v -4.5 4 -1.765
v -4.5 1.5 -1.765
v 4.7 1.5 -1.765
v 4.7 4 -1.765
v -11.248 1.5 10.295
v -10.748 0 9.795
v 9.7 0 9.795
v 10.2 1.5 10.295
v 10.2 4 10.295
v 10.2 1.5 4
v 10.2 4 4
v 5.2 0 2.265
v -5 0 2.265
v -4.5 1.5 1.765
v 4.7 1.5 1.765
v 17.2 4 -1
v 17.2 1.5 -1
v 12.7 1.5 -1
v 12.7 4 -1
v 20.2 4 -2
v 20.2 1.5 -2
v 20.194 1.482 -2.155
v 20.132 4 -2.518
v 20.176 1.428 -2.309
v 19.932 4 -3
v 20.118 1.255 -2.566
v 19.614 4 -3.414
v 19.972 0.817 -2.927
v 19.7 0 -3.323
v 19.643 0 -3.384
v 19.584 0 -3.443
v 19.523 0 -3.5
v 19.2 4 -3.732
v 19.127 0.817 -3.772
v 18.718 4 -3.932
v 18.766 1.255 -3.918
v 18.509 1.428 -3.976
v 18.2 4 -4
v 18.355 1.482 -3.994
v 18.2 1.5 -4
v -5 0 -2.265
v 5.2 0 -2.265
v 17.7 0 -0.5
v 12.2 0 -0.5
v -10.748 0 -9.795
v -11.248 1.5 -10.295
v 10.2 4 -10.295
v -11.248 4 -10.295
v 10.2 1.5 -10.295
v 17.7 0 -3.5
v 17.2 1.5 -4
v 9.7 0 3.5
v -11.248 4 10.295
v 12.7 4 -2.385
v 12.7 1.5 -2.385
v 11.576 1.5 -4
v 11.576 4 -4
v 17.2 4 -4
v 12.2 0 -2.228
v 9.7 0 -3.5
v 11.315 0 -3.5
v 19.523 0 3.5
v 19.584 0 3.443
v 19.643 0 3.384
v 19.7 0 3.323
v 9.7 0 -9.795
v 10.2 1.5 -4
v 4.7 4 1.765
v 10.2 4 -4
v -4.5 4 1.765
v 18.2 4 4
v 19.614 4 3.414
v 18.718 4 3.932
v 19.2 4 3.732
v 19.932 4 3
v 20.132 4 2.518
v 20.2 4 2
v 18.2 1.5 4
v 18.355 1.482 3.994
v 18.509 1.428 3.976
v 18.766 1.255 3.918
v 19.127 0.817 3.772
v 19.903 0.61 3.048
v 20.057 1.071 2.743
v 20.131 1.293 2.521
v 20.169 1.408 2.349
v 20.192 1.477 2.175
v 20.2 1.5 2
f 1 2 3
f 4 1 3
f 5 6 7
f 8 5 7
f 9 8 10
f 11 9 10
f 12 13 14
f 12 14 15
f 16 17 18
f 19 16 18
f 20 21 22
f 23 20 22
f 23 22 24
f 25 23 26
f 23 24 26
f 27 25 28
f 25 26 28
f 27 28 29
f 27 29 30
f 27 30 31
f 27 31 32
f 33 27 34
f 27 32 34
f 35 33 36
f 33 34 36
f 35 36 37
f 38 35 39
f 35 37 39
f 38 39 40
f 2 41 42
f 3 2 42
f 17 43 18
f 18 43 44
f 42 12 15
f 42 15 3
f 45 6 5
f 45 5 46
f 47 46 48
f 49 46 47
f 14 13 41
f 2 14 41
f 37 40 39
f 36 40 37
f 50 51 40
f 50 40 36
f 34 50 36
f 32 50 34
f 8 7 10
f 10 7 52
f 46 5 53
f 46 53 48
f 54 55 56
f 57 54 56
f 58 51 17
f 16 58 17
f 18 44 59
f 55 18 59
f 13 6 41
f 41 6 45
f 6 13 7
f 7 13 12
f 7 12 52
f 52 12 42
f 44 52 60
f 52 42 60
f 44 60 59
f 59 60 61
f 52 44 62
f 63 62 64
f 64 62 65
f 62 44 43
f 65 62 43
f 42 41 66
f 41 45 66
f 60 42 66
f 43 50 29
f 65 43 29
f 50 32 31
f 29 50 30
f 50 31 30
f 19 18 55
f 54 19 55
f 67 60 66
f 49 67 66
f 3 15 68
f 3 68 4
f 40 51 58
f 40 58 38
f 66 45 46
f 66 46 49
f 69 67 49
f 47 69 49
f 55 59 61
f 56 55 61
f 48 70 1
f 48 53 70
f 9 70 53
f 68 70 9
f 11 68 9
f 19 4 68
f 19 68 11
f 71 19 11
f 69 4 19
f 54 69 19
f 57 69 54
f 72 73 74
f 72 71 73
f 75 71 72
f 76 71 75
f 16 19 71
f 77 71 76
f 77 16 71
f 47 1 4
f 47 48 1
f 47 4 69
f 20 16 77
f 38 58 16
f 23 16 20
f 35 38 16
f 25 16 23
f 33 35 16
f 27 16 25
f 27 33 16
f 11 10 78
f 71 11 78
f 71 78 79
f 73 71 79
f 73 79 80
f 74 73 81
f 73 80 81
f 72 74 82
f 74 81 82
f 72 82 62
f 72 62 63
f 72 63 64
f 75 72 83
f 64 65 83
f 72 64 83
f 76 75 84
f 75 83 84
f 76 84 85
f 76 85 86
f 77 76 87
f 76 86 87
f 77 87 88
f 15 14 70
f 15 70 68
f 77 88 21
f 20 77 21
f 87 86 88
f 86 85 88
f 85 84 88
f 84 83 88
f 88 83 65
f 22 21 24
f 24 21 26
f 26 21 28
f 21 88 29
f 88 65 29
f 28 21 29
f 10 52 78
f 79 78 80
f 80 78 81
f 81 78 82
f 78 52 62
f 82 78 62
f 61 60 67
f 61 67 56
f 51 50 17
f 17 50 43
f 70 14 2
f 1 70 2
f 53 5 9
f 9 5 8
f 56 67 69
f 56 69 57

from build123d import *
from OCP.BRepFilletAPI import BRepFilletAPI_MakeChamfer

# Parameters (mm, degrees)
SKETCH1_W           = 21.447515714
SKETCH1_H           = 20.590988136
SKETCH1_W_2         = 9.2
SKETCH1_H_2         = 3.53
BOSS_EXTRUDE1_DEPTH = 4
SKETCH2_W           = 10
SKETCH2_H           = 8
BOSS_EXTRUDE3_DEPTH = 4
CUT_EXTRUDE1_DEPTH  = 24.022536743
CHAMFER1_SIZE       = 1.5
CHAMFER1_SIZE2      = 0.5
FILLET1_R           = 2


with BuildPart() as part:
    # Sketch1 → Boss-Extrude1 (new body)
    with BuildSketch(Plane(origin=(0, 0, 0), x_dir=(1, 0, 0), z_dir=(0, 1, 0))):
        with Locations((-0.523757857, 0)):
            Rectangle(SKETCH1_W, SKETCH1_H)
        with Locations((0.1, 0)):
            Rectangle(SKETCH1_W_2, SKETCH1_H_2, mode=Mode.SUBTRACT)
    extrude(amount=BOSS_EXTRUDE1_DEPTH)

    # Sketch2 → Boss-Extrude3 (add)
    with BuildSketch(Plane(origin=(0, 0, 0), x_dir=(1, 0, 0), z_dir=(0, 1, 0))):
        with Locations((15.2, 0)):
            Rectangle(SKETCH2_W, SKETCH2_H)
    extrude(amount=BOSS_EXTRUDE3_DEPTH)

    # Sketch3 → Cut-Extrude1 (cut, through all)
    with BuildSketch(Plane(origin=(0, 0, 0), x_dir=(1, 0, 0), z_dir=(0, 1, 0))):
        Polygon((12.7, 1), (12.7, 2.38454447), (11.576199706, 4), (12.7, 4), (17.2, 4), (17.2, 1), align=None)
    extrude(amount=CUT_EXTRUDE1_DEPTH, mode=Mode.SUBTRACT)

    # Chamfer1: one chamfer whose edges measure the first distance from different faces: ONE call of the kernel's chamfer builder (chamfer() names one face for all edges)
    chamfer1_edges_1 = [part.edges().sort_by_distance(p)[0] for p in [
        (4.7, 0, 0),
    ]]
    chamfer1_side_1 = [part.faces().sort_by_distance(p)[0] for p in [
        (4.7, 2, 0),
    ]]
    chamfer1_edges_2 = [part.edges().sort_by_distance(p)[0] for p in [
        (0.1, 0, -1.765),
    ]]
    chamfer1_side_2 = [part.faces().sort_by_distance(p)[0] for p in [
        (0.1, 2, -1.765),
    ]]
    chamfer1_edges_3 = [part.edges().sort_by_distance(p)[0] for p in [
        (-4.5, 0, 0),
    ]]
    chamfer1_side_3 = [part.faces().sort_by_distance(p)[0] for p in [
        (-4.5, 2, 0),
    ]]
    chamfer1_edges_4 = [part.edges().sort_by_distance(p)[0] for p in [
        (0.1, 0, 1.765),
    ]]
    chamfer1_side_4 = [part.faces().sort_by_distance(p)[0] for p in [
        (0.1, 2, 1.765),
    ]]
    chamfer1_edges_5 = [part.edges().sort_by_distance(p)[0] for p in [
        (10.2, 0, -7.147747034),
    ]]
    chamfer1_side_5 = [part.faces().sort_by_distance(p)[0] for p in [
        (10.2, 2, -7.147747034),
    ]]
    chamfer1_edges_6 = [part.edges().sort_by_distance(p)[0] for p in [
        (15.2, 0, 4),
    ]]
    chamfer1_side_6 = [part.faces().sort_by_distance(p)[0] for p in [
        (15.2, 2, 4),
    ]]
    chamfer1_edges_7 = [part.edges().sort_by_distance(p)[0] for p in [
        (20.2, 0, 0),
    ]]
    chamfer1_side_7 = [part.faces().sort_by_distance(p)[0] for p in [
        (20.2, 2, 0),
    ]]
    chamfer1_edges_8 = [part.edges().sort_by_distance(p)[0] for p in [
        (18.7, 0, -4),
    ]]
    chamfer1_side_8 = [part.faces().sort_by_distance(p)[0] for p in [
        (18.7, 2, -4),
    ]]
    chamfer1_edges_9 = [part.edges().sort_by_distance(p)[0] for p in [
        (10.888099853, 0, -4),
    ]]
    chamfer1_side_9 = [part.faces().sort_by_distance(p)[0] for p in [
        (10.888099853, 2, -4),
    ]]
    chamfer1_edges_10 = [part.edges().sort_by_distance(p)[0] for p in [
        (12.138099853, 0, -3.192272235),
    ]]
    chamfer1_side_10 = [part.faces().sort_by_distance(p)[0] for p in [
        (12.138099853, 2, -3.192272235),
    ]]
    chamfer1_edges_11 = [part.edges().sort_by_distance(p)[0] for p in [
        (12.7, 0, -1.692272235),
    ]]
    chamfer1_side_11 = [part.faces().sort_by_distance(p)[0] for p in [
        (12.7, 2, -1.692272235),
    ]]
    chamfer1_edges_12 = [part.edges().sort_by_distance(p)[0] for p in [
        (14.95, 0, -1),
    ]]
    chamfer1_side_12 = [part.faces().sort_by_distance(p)[0] for p in [
        (14.95, 2, -1),
    ]]
    chamfer1_edges_13 = [part.edges().sort_by_distance(p)[0] for p in [
        (17.2, 0, -2.5),
    ]]
    chamfer1_side_13 = [part.faces().sort_by_distance(p)[0] for p in [
        (17.2, 2, -2.5),
    ]]
    chamfer1_edges_14 = [part.edges().sort_by_distance(p)[0] for p in [
        (-0.523757857, 0, -10.295494068),
    ]]
    chamfer1_side_14 = [part.faces().sort_by_distance(p)[0] for p in [
        (-0.523757857, 2, -10.295494068),
    ]]
    chamfer1_edges_15 = [part.edges().sort_by_distance(p)[0] for p in [
        (10.2, 0, 7.147747034),
    ]]
    chamfer1_side_15 = [part.faces().sort_by_distance(p)[0] for p in [
        (10.2, 2, 7.147747034),
    ]]
    chamfer1_edges_16 = [part.edges().sort_by_distance(p)[0] for p in [
        (-0.523757857, 0, 10.295494068),
    ]]
    chamfer1_side_16 = [part.faces().sort_by_distance(p)[0] for p in [
        (-0.523757857, 2, 10.295494068),
    ]]
    chamfer1_edges_17 = [part.edges().sort_by_distance(p)[0] for p in [
        (-11.247515714, 0, 0),
    ]]
    chamfer1_side_17 = [part.faces().sort_by_distance(p)[0] for p in [
        (-11.247515714, 2, 0),
    ]]
    chamfer1 = BRepFilletAPI_MakeChamfer(part.part.solid().wrapped)
    for e in chamfer1_edges_1:
        chamfer1.Add(CHAMFER1_SIZE, CHAMFER1_SIZE2, e.wrapped, chamfer1_side_1[0].wrapped)  # the first distance lies on this face
    for e in chamfer1_edges_2:
        chamfer1.Add(CHAMFER1_SIZE, CHAMFER1_SIZE2, e.wrapped, chamfer1_side_2[0].wrapped)  # the first distance lies on this face
    for e in chamfer1_edges_3:
        chamfer1.Add(CHAMFER1_SIZE, CHAMFER1_SIZE2, e.wrapped, chamfer1_side_3[0].wrapped)  # the first distance lies on this face
    for e in chamfer1_edges_4:
        chamfer1.Add(CHAMFER1_SIZE, CHAMFER1_SIZE2, e.wrapped, chamfer1_side_4[0].wrapped)  # the first distance lies on this face
    for e in chamfer1_edges_5:
        chamfer1.Add(CHAMFER1_SIZE, CHAMFER1_SIZE2, e.wrapped, chamfer1_side_5[0].wrapped)  # the first distance lies on this face
    for e in chamfer1_edges_6:
        chamfer1.Add(CHAMFER1_SIZE, CHAMFER1_SIZE2, e.wrapped, chamfer1_side_6[0].wrapped)  # the first distance lies on this face
    for e in chamfer1_edges_7:
        chamfer1.Add(CHAMFER1_SIZE, CHAMFER1_SIZE2, e.wrapped, chamfer1_side_7[0].wrapped)  # the first distance lies on this face
    for e in chamfer1_edges_8:
        chamfer1.Add(CHAMFER1_SIZE, CHAMFER1_SIZE2, e.wrapped, chamfer1_side_8[0].wrapped)  # the first distance lies on this face
    for e in chamfer1_edges_9:
        chamfer1.Add(CHAMFER1_SIZE, CHAMFER1_SIZE2, e.wrapped, chamfer1_side_9[0].wrapped)  # the first distance lies on this face
    for e in chamfer1_edges_10:
        chamfer1.Add(CHAMFER1_SIZE, CHAMFER1_SIZE2, e.wrapped, chamfer1_side_10[0].wrapped)  # the first distance lies on this face
    for e in chamfer1_edges_11:
        chamfer1.Add(CHAMFER1_SIZE, CHAMFER1_SIZE2, e.wrapped, chamfer1_side_11[0].wrapped)  # the first distance lies on this face
    for e in chamfer1_edges_12:
        chamfer1.Add(CHAMFER1_SIZE, CHAMFER1_SIZE2, e.wrapped, chamfer1_side_12[0].wrapped)  # the first distance lies on this face
    for e in chamfer1_edges_13:
        chamfer1.Add(CHAMFER1_SIZE, CHAMFER1_SIZE2, e.wrapped, chamfer1_side_13[0].wrapped)  # the first distance lies on this face
    for e in chamfer1_edges_14:
        chamfer1.Add(CHAMFER1_SIZE, CHAMFER1_SIZE2, e.wrapped, chamfer1_side_14[0].wrapped)  # the first distance lies on this face
    for e in chamfer1_edges_15:
        chamfer1.Add(CHAMFER1_SIZE, CHAMFER1_SIZE2, e.wrapped, chamfer1_side_15[0].wrapped)  # the first distance lies on this face
    for e in chamfer1_edges_16:
        chamfer1.Add(CHAMFER1_SIZE, CHAMFER1_SIZE2, e.wrapped, chamfer1_side_16[0].wrapped)  # the first distance lies on this face
    for e in chamfer1_edges_17:
        chamfer1.Add(CHAMFER1_SIZE, CHAMFER1_SIZE2, e.wrapped, chamfer1_side_17[0].wrapped)  # the first distance lies on this face
    add(Compound.cast(chamfer1.Shape()), mode=Mode.REPLACE)

    # Fillet1
    # the kernel refuses this fillet: 2 mm, written as the material it takes off along each edge
    with BuildSketch(Plane(origin=(20.2, -3.5, 4), x_dir=(-1, 0, 0), z_dir=(0, 1, 0)), Plane(origin=(20.2, -3.5, -4), x_dir=(0, 0, 1), z_dir=(0, 1, 0))) as fillet1_piece_1:
        with BuildLine():
            CenterArc((FILLET1_R, -FILLET1_R), FILLET1_R, 90, 90)
            Line((0, -FILLET1_R), (0, 0))
            Line((0, 0), (FILLET1_R, 0))
        make_face()
    extrude(amount=12.5, mode=Mode.SUBTRACT)


solid = part.part
